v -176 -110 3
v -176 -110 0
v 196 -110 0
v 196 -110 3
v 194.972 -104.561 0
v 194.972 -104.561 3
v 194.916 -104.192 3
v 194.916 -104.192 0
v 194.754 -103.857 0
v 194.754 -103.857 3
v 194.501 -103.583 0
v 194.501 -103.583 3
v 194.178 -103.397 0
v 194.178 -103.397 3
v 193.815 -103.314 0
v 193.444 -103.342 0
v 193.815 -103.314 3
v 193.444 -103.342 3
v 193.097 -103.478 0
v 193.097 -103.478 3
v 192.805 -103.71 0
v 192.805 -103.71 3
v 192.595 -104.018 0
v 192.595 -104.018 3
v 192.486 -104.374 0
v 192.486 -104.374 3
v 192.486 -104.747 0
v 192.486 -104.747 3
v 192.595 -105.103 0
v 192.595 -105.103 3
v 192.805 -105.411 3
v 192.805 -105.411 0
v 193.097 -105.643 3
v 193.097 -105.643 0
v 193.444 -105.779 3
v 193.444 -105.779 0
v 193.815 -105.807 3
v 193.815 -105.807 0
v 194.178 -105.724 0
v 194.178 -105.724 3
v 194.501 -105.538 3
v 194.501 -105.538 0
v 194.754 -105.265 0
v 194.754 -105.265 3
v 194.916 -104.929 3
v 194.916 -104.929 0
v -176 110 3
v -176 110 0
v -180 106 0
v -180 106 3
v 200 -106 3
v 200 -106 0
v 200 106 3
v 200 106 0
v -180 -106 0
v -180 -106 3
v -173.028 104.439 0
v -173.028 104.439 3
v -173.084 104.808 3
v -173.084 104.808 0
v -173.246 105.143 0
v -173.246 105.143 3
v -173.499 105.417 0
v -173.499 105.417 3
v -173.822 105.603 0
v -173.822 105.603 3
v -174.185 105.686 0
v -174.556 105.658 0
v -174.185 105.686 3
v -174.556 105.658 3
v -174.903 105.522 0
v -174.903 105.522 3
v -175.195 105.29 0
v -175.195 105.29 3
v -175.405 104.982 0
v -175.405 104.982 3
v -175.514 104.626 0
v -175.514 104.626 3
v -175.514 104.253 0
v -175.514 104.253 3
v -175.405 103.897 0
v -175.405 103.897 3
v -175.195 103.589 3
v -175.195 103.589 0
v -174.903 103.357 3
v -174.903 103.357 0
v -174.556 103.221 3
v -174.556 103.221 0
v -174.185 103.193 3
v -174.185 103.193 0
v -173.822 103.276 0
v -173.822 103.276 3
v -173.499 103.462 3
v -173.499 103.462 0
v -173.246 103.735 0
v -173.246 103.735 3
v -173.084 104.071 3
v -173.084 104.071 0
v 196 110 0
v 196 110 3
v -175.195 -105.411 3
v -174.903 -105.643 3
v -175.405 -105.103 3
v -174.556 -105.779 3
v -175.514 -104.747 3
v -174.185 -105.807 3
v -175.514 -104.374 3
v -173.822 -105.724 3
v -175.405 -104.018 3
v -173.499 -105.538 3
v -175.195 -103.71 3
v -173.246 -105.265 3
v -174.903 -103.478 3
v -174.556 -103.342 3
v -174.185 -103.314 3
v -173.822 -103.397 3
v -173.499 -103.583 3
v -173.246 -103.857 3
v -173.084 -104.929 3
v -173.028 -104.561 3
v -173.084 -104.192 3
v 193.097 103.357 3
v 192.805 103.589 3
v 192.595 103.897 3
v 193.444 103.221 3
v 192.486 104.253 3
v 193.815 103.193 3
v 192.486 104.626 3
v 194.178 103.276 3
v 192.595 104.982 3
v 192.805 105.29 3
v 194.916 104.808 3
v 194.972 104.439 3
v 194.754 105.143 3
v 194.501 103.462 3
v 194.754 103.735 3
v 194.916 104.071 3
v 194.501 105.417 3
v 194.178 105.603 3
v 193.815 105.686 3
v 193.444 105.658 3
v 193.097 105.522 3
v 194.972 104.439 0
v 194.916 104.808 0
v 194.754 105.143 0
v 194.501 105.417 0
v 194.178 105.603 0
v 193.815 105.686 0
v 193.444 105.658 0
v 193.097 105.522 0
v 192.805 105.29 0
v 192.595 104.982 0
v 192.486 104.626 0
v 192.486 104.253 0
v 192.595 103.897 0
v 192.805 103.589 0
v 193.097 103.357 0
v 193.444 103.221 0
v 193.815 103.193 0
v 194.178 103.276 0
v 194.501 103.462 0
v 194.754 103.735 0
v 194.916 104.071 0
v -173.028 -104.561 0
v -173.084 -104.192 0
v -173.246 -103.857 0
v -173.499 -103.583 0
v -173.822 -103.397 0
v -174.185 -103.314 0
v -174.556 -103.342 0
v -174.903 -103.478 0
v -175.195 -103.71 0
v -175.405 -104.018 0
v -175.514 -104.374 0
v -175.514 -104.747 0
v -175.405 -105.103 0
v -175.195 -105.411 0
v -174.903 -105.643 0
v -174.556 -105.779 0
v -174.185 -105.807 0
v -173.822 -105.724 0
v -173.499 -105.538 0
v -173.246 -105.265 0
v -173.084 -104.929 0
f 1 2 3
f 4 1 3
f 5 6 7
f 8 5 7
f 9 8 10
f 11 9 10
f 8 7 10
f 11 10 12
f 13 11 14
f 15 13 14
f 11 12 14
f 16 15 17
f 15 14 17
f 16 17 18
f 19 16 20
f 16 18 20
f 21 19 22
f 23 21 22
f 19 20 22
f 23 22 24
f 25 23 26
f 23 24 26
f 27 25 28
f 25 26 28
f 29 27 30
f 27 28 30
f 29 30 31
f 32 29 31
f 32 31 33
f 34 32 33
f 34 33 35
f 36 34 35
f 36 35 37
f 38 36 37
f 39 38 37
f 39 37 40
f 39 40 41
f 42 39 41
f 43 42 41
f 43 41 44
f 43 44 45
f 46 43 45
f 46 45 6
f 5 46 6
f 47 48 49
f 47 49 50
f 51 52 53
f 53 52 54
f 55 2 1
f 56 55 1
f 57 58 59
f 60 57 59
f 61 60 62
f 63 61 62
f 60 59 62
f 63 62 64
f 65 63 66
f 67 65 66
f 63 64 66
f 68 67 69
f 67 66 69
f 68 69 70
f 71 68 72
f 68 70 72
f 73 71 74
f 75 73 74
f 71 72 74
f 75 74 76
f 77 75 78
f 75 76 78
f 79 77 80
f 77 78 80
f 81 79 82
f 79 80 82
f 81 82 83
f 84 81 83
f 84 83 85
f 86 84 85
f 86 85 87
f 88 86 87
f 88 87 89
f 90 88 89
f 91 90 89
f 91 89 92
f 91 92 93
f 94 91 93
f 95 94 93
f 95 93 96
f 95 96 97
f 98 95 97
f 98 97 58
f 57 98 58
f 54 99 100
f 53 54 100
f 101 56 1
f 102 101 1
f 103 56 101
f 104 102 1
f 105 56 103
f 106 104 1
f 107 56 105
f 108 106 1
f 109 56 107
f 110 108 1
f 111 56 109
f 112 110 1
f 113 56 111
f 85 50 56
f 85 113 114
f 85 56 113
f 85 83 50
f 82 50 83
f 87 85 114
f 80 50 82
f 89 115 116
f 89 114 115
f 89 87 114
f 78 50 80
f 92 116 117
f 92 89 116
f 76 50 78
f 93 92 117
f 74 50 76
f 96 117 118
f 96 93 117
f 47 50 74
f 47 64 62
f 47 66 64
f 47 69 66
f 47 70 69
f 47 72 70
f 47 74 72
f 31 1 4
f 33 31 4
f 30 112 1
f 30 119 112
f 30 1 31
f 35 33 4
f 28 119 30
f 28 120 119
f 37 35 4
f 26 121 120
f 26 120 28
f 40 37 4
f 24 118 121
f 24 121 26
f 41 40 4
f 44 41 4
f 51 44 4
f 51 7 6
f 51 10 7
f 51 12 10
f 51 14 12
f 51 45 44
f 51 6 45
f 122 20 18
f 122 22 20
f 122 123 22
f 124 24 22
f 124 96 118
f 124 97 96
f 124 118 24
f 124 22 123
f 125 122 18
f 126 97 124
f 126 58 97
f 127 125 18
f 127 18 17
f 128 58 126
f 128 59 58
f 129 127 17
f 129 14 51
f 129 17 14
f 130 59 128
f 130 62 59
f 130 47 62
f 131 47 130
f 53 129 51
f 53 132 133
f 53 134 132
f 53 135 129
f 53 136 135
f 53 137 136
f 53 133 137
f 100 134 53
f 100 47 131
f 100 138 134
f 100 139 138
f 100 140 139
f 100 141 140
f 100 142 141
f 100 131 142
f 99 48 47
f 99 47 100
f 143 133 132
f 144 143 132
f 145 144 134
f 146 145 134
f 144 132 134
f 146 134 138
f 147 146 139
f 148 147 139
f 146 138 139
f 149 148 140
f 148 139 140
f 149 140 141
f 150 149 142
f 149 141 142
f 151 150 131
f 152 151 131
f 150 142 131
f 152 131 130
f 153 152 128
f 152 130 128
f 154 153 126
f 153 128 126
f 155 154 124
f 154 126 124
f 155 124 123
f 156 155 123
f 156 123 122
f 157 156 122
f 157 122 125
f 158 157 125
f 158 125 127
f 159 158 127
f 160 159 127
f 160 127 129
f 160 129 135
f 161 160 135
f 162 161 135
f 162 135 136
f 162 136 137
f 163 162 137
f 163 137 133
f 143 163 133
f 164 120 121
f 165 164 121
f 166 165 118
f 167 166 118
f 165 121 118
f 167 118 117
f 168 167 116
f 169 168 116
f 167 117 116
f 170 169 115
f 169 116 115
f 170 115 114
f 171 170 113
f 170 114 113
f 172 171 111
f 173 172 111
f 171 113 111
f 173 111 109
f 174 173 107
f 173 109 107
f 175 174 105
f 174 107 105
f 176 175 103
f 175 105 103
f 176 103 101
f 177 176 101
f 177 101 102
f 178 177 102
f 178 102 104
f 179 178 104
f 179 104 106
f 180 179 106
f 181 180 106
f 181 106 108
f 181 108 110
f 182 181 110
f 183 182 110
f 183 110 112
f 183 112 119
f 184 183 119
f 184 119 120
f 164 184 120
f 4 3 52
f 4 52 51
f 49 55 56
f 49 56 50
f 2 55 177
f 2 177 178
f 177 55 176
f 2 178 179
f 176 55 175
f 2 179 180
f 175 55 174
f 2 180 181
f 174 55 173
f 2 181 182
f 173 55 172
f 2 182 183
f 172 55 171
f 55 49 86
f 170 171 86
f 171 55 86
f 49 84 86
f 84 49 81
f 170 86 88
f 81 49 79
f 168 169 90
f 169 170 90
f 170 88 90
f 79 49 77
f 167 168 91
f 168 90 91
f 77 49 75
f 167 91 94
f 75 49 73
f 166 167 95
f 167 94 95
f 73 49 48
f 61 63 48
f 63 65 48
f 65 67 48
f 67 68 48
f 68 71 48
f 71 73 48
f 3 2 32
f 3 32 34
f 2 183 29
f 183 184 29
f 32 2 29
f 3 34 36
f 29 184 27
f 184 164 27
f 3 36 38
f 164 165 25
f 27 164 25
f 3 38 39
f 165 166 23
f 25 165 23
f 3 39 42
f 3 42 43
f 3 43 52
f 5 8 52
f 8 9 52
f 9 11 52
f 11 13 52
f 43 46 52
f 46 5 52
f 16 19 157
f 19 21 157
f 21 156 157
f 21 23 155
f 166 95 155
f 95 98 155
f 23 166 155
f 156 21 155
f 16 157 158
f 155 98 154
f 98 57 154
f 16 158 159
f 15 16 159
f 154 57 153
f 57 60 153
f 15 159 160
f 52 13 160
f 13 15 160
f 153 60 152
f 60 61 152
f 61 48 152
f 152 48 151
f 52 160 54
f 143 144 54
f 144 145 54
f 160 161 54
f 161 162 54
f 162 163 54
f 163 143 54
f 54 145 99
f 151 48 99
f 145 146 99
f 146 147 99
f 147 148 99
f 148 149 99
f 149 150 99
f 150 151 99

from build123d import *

# Parameters (mm, degrees)
SKETCH1_W           = 380
SKETCH1_H           = 220
BOSS_EXTRUDE1_DEPTH = 3
SKETCH2_R           = 1.25
CUT_EXTRUDE1_DEPTH  = 10
CHAMFER1_SIZE       = 4


with BuildPart() as part:
    # Sketch1 → Boss-Extrude1 (new body)
    with BuildSketch(Plane.XY):
        with Locations((10, 0)):
            Rectangle(SKETCH1_W, SKETCH1_H)
    extrude(amount=BOSS_EXTRUDE1_DEPTH)

    # Sketch2 → Cut-Extrude1 (cut)
    with BuildSketch(Plane.XY.offset(3)):
        with Locations((-174.278337167, -104.560656269)):
            Circle(SKETCH2_R)
        with Locations((-174.278337167, 104.439343731)):
            Circle(SKETCH2_R)
        with Locations((193.721662833, -104.560656269)):
            Circle(SKETCH2_R)
        with Locations((193.721662833, 104.439343731)):
            Circle(SKETCH2_R)
    extrude(amount=-CUT_EXTRUDE1_DEPTH, mode=Mode.SUBTRACT)

    # Chamfer1
    chamfer1_edges = [part.edges().sort_by_distance(p)[0] for p in [
        (200, 110, 1.5),
        (200, -110, 1.5),
        (-180, -110, 1.5),
        (-180, 110, 1.5),
    ]]
    chamfer(chamfer1_edges, length=CHAMFER1_SIZE)


solid = part.part
